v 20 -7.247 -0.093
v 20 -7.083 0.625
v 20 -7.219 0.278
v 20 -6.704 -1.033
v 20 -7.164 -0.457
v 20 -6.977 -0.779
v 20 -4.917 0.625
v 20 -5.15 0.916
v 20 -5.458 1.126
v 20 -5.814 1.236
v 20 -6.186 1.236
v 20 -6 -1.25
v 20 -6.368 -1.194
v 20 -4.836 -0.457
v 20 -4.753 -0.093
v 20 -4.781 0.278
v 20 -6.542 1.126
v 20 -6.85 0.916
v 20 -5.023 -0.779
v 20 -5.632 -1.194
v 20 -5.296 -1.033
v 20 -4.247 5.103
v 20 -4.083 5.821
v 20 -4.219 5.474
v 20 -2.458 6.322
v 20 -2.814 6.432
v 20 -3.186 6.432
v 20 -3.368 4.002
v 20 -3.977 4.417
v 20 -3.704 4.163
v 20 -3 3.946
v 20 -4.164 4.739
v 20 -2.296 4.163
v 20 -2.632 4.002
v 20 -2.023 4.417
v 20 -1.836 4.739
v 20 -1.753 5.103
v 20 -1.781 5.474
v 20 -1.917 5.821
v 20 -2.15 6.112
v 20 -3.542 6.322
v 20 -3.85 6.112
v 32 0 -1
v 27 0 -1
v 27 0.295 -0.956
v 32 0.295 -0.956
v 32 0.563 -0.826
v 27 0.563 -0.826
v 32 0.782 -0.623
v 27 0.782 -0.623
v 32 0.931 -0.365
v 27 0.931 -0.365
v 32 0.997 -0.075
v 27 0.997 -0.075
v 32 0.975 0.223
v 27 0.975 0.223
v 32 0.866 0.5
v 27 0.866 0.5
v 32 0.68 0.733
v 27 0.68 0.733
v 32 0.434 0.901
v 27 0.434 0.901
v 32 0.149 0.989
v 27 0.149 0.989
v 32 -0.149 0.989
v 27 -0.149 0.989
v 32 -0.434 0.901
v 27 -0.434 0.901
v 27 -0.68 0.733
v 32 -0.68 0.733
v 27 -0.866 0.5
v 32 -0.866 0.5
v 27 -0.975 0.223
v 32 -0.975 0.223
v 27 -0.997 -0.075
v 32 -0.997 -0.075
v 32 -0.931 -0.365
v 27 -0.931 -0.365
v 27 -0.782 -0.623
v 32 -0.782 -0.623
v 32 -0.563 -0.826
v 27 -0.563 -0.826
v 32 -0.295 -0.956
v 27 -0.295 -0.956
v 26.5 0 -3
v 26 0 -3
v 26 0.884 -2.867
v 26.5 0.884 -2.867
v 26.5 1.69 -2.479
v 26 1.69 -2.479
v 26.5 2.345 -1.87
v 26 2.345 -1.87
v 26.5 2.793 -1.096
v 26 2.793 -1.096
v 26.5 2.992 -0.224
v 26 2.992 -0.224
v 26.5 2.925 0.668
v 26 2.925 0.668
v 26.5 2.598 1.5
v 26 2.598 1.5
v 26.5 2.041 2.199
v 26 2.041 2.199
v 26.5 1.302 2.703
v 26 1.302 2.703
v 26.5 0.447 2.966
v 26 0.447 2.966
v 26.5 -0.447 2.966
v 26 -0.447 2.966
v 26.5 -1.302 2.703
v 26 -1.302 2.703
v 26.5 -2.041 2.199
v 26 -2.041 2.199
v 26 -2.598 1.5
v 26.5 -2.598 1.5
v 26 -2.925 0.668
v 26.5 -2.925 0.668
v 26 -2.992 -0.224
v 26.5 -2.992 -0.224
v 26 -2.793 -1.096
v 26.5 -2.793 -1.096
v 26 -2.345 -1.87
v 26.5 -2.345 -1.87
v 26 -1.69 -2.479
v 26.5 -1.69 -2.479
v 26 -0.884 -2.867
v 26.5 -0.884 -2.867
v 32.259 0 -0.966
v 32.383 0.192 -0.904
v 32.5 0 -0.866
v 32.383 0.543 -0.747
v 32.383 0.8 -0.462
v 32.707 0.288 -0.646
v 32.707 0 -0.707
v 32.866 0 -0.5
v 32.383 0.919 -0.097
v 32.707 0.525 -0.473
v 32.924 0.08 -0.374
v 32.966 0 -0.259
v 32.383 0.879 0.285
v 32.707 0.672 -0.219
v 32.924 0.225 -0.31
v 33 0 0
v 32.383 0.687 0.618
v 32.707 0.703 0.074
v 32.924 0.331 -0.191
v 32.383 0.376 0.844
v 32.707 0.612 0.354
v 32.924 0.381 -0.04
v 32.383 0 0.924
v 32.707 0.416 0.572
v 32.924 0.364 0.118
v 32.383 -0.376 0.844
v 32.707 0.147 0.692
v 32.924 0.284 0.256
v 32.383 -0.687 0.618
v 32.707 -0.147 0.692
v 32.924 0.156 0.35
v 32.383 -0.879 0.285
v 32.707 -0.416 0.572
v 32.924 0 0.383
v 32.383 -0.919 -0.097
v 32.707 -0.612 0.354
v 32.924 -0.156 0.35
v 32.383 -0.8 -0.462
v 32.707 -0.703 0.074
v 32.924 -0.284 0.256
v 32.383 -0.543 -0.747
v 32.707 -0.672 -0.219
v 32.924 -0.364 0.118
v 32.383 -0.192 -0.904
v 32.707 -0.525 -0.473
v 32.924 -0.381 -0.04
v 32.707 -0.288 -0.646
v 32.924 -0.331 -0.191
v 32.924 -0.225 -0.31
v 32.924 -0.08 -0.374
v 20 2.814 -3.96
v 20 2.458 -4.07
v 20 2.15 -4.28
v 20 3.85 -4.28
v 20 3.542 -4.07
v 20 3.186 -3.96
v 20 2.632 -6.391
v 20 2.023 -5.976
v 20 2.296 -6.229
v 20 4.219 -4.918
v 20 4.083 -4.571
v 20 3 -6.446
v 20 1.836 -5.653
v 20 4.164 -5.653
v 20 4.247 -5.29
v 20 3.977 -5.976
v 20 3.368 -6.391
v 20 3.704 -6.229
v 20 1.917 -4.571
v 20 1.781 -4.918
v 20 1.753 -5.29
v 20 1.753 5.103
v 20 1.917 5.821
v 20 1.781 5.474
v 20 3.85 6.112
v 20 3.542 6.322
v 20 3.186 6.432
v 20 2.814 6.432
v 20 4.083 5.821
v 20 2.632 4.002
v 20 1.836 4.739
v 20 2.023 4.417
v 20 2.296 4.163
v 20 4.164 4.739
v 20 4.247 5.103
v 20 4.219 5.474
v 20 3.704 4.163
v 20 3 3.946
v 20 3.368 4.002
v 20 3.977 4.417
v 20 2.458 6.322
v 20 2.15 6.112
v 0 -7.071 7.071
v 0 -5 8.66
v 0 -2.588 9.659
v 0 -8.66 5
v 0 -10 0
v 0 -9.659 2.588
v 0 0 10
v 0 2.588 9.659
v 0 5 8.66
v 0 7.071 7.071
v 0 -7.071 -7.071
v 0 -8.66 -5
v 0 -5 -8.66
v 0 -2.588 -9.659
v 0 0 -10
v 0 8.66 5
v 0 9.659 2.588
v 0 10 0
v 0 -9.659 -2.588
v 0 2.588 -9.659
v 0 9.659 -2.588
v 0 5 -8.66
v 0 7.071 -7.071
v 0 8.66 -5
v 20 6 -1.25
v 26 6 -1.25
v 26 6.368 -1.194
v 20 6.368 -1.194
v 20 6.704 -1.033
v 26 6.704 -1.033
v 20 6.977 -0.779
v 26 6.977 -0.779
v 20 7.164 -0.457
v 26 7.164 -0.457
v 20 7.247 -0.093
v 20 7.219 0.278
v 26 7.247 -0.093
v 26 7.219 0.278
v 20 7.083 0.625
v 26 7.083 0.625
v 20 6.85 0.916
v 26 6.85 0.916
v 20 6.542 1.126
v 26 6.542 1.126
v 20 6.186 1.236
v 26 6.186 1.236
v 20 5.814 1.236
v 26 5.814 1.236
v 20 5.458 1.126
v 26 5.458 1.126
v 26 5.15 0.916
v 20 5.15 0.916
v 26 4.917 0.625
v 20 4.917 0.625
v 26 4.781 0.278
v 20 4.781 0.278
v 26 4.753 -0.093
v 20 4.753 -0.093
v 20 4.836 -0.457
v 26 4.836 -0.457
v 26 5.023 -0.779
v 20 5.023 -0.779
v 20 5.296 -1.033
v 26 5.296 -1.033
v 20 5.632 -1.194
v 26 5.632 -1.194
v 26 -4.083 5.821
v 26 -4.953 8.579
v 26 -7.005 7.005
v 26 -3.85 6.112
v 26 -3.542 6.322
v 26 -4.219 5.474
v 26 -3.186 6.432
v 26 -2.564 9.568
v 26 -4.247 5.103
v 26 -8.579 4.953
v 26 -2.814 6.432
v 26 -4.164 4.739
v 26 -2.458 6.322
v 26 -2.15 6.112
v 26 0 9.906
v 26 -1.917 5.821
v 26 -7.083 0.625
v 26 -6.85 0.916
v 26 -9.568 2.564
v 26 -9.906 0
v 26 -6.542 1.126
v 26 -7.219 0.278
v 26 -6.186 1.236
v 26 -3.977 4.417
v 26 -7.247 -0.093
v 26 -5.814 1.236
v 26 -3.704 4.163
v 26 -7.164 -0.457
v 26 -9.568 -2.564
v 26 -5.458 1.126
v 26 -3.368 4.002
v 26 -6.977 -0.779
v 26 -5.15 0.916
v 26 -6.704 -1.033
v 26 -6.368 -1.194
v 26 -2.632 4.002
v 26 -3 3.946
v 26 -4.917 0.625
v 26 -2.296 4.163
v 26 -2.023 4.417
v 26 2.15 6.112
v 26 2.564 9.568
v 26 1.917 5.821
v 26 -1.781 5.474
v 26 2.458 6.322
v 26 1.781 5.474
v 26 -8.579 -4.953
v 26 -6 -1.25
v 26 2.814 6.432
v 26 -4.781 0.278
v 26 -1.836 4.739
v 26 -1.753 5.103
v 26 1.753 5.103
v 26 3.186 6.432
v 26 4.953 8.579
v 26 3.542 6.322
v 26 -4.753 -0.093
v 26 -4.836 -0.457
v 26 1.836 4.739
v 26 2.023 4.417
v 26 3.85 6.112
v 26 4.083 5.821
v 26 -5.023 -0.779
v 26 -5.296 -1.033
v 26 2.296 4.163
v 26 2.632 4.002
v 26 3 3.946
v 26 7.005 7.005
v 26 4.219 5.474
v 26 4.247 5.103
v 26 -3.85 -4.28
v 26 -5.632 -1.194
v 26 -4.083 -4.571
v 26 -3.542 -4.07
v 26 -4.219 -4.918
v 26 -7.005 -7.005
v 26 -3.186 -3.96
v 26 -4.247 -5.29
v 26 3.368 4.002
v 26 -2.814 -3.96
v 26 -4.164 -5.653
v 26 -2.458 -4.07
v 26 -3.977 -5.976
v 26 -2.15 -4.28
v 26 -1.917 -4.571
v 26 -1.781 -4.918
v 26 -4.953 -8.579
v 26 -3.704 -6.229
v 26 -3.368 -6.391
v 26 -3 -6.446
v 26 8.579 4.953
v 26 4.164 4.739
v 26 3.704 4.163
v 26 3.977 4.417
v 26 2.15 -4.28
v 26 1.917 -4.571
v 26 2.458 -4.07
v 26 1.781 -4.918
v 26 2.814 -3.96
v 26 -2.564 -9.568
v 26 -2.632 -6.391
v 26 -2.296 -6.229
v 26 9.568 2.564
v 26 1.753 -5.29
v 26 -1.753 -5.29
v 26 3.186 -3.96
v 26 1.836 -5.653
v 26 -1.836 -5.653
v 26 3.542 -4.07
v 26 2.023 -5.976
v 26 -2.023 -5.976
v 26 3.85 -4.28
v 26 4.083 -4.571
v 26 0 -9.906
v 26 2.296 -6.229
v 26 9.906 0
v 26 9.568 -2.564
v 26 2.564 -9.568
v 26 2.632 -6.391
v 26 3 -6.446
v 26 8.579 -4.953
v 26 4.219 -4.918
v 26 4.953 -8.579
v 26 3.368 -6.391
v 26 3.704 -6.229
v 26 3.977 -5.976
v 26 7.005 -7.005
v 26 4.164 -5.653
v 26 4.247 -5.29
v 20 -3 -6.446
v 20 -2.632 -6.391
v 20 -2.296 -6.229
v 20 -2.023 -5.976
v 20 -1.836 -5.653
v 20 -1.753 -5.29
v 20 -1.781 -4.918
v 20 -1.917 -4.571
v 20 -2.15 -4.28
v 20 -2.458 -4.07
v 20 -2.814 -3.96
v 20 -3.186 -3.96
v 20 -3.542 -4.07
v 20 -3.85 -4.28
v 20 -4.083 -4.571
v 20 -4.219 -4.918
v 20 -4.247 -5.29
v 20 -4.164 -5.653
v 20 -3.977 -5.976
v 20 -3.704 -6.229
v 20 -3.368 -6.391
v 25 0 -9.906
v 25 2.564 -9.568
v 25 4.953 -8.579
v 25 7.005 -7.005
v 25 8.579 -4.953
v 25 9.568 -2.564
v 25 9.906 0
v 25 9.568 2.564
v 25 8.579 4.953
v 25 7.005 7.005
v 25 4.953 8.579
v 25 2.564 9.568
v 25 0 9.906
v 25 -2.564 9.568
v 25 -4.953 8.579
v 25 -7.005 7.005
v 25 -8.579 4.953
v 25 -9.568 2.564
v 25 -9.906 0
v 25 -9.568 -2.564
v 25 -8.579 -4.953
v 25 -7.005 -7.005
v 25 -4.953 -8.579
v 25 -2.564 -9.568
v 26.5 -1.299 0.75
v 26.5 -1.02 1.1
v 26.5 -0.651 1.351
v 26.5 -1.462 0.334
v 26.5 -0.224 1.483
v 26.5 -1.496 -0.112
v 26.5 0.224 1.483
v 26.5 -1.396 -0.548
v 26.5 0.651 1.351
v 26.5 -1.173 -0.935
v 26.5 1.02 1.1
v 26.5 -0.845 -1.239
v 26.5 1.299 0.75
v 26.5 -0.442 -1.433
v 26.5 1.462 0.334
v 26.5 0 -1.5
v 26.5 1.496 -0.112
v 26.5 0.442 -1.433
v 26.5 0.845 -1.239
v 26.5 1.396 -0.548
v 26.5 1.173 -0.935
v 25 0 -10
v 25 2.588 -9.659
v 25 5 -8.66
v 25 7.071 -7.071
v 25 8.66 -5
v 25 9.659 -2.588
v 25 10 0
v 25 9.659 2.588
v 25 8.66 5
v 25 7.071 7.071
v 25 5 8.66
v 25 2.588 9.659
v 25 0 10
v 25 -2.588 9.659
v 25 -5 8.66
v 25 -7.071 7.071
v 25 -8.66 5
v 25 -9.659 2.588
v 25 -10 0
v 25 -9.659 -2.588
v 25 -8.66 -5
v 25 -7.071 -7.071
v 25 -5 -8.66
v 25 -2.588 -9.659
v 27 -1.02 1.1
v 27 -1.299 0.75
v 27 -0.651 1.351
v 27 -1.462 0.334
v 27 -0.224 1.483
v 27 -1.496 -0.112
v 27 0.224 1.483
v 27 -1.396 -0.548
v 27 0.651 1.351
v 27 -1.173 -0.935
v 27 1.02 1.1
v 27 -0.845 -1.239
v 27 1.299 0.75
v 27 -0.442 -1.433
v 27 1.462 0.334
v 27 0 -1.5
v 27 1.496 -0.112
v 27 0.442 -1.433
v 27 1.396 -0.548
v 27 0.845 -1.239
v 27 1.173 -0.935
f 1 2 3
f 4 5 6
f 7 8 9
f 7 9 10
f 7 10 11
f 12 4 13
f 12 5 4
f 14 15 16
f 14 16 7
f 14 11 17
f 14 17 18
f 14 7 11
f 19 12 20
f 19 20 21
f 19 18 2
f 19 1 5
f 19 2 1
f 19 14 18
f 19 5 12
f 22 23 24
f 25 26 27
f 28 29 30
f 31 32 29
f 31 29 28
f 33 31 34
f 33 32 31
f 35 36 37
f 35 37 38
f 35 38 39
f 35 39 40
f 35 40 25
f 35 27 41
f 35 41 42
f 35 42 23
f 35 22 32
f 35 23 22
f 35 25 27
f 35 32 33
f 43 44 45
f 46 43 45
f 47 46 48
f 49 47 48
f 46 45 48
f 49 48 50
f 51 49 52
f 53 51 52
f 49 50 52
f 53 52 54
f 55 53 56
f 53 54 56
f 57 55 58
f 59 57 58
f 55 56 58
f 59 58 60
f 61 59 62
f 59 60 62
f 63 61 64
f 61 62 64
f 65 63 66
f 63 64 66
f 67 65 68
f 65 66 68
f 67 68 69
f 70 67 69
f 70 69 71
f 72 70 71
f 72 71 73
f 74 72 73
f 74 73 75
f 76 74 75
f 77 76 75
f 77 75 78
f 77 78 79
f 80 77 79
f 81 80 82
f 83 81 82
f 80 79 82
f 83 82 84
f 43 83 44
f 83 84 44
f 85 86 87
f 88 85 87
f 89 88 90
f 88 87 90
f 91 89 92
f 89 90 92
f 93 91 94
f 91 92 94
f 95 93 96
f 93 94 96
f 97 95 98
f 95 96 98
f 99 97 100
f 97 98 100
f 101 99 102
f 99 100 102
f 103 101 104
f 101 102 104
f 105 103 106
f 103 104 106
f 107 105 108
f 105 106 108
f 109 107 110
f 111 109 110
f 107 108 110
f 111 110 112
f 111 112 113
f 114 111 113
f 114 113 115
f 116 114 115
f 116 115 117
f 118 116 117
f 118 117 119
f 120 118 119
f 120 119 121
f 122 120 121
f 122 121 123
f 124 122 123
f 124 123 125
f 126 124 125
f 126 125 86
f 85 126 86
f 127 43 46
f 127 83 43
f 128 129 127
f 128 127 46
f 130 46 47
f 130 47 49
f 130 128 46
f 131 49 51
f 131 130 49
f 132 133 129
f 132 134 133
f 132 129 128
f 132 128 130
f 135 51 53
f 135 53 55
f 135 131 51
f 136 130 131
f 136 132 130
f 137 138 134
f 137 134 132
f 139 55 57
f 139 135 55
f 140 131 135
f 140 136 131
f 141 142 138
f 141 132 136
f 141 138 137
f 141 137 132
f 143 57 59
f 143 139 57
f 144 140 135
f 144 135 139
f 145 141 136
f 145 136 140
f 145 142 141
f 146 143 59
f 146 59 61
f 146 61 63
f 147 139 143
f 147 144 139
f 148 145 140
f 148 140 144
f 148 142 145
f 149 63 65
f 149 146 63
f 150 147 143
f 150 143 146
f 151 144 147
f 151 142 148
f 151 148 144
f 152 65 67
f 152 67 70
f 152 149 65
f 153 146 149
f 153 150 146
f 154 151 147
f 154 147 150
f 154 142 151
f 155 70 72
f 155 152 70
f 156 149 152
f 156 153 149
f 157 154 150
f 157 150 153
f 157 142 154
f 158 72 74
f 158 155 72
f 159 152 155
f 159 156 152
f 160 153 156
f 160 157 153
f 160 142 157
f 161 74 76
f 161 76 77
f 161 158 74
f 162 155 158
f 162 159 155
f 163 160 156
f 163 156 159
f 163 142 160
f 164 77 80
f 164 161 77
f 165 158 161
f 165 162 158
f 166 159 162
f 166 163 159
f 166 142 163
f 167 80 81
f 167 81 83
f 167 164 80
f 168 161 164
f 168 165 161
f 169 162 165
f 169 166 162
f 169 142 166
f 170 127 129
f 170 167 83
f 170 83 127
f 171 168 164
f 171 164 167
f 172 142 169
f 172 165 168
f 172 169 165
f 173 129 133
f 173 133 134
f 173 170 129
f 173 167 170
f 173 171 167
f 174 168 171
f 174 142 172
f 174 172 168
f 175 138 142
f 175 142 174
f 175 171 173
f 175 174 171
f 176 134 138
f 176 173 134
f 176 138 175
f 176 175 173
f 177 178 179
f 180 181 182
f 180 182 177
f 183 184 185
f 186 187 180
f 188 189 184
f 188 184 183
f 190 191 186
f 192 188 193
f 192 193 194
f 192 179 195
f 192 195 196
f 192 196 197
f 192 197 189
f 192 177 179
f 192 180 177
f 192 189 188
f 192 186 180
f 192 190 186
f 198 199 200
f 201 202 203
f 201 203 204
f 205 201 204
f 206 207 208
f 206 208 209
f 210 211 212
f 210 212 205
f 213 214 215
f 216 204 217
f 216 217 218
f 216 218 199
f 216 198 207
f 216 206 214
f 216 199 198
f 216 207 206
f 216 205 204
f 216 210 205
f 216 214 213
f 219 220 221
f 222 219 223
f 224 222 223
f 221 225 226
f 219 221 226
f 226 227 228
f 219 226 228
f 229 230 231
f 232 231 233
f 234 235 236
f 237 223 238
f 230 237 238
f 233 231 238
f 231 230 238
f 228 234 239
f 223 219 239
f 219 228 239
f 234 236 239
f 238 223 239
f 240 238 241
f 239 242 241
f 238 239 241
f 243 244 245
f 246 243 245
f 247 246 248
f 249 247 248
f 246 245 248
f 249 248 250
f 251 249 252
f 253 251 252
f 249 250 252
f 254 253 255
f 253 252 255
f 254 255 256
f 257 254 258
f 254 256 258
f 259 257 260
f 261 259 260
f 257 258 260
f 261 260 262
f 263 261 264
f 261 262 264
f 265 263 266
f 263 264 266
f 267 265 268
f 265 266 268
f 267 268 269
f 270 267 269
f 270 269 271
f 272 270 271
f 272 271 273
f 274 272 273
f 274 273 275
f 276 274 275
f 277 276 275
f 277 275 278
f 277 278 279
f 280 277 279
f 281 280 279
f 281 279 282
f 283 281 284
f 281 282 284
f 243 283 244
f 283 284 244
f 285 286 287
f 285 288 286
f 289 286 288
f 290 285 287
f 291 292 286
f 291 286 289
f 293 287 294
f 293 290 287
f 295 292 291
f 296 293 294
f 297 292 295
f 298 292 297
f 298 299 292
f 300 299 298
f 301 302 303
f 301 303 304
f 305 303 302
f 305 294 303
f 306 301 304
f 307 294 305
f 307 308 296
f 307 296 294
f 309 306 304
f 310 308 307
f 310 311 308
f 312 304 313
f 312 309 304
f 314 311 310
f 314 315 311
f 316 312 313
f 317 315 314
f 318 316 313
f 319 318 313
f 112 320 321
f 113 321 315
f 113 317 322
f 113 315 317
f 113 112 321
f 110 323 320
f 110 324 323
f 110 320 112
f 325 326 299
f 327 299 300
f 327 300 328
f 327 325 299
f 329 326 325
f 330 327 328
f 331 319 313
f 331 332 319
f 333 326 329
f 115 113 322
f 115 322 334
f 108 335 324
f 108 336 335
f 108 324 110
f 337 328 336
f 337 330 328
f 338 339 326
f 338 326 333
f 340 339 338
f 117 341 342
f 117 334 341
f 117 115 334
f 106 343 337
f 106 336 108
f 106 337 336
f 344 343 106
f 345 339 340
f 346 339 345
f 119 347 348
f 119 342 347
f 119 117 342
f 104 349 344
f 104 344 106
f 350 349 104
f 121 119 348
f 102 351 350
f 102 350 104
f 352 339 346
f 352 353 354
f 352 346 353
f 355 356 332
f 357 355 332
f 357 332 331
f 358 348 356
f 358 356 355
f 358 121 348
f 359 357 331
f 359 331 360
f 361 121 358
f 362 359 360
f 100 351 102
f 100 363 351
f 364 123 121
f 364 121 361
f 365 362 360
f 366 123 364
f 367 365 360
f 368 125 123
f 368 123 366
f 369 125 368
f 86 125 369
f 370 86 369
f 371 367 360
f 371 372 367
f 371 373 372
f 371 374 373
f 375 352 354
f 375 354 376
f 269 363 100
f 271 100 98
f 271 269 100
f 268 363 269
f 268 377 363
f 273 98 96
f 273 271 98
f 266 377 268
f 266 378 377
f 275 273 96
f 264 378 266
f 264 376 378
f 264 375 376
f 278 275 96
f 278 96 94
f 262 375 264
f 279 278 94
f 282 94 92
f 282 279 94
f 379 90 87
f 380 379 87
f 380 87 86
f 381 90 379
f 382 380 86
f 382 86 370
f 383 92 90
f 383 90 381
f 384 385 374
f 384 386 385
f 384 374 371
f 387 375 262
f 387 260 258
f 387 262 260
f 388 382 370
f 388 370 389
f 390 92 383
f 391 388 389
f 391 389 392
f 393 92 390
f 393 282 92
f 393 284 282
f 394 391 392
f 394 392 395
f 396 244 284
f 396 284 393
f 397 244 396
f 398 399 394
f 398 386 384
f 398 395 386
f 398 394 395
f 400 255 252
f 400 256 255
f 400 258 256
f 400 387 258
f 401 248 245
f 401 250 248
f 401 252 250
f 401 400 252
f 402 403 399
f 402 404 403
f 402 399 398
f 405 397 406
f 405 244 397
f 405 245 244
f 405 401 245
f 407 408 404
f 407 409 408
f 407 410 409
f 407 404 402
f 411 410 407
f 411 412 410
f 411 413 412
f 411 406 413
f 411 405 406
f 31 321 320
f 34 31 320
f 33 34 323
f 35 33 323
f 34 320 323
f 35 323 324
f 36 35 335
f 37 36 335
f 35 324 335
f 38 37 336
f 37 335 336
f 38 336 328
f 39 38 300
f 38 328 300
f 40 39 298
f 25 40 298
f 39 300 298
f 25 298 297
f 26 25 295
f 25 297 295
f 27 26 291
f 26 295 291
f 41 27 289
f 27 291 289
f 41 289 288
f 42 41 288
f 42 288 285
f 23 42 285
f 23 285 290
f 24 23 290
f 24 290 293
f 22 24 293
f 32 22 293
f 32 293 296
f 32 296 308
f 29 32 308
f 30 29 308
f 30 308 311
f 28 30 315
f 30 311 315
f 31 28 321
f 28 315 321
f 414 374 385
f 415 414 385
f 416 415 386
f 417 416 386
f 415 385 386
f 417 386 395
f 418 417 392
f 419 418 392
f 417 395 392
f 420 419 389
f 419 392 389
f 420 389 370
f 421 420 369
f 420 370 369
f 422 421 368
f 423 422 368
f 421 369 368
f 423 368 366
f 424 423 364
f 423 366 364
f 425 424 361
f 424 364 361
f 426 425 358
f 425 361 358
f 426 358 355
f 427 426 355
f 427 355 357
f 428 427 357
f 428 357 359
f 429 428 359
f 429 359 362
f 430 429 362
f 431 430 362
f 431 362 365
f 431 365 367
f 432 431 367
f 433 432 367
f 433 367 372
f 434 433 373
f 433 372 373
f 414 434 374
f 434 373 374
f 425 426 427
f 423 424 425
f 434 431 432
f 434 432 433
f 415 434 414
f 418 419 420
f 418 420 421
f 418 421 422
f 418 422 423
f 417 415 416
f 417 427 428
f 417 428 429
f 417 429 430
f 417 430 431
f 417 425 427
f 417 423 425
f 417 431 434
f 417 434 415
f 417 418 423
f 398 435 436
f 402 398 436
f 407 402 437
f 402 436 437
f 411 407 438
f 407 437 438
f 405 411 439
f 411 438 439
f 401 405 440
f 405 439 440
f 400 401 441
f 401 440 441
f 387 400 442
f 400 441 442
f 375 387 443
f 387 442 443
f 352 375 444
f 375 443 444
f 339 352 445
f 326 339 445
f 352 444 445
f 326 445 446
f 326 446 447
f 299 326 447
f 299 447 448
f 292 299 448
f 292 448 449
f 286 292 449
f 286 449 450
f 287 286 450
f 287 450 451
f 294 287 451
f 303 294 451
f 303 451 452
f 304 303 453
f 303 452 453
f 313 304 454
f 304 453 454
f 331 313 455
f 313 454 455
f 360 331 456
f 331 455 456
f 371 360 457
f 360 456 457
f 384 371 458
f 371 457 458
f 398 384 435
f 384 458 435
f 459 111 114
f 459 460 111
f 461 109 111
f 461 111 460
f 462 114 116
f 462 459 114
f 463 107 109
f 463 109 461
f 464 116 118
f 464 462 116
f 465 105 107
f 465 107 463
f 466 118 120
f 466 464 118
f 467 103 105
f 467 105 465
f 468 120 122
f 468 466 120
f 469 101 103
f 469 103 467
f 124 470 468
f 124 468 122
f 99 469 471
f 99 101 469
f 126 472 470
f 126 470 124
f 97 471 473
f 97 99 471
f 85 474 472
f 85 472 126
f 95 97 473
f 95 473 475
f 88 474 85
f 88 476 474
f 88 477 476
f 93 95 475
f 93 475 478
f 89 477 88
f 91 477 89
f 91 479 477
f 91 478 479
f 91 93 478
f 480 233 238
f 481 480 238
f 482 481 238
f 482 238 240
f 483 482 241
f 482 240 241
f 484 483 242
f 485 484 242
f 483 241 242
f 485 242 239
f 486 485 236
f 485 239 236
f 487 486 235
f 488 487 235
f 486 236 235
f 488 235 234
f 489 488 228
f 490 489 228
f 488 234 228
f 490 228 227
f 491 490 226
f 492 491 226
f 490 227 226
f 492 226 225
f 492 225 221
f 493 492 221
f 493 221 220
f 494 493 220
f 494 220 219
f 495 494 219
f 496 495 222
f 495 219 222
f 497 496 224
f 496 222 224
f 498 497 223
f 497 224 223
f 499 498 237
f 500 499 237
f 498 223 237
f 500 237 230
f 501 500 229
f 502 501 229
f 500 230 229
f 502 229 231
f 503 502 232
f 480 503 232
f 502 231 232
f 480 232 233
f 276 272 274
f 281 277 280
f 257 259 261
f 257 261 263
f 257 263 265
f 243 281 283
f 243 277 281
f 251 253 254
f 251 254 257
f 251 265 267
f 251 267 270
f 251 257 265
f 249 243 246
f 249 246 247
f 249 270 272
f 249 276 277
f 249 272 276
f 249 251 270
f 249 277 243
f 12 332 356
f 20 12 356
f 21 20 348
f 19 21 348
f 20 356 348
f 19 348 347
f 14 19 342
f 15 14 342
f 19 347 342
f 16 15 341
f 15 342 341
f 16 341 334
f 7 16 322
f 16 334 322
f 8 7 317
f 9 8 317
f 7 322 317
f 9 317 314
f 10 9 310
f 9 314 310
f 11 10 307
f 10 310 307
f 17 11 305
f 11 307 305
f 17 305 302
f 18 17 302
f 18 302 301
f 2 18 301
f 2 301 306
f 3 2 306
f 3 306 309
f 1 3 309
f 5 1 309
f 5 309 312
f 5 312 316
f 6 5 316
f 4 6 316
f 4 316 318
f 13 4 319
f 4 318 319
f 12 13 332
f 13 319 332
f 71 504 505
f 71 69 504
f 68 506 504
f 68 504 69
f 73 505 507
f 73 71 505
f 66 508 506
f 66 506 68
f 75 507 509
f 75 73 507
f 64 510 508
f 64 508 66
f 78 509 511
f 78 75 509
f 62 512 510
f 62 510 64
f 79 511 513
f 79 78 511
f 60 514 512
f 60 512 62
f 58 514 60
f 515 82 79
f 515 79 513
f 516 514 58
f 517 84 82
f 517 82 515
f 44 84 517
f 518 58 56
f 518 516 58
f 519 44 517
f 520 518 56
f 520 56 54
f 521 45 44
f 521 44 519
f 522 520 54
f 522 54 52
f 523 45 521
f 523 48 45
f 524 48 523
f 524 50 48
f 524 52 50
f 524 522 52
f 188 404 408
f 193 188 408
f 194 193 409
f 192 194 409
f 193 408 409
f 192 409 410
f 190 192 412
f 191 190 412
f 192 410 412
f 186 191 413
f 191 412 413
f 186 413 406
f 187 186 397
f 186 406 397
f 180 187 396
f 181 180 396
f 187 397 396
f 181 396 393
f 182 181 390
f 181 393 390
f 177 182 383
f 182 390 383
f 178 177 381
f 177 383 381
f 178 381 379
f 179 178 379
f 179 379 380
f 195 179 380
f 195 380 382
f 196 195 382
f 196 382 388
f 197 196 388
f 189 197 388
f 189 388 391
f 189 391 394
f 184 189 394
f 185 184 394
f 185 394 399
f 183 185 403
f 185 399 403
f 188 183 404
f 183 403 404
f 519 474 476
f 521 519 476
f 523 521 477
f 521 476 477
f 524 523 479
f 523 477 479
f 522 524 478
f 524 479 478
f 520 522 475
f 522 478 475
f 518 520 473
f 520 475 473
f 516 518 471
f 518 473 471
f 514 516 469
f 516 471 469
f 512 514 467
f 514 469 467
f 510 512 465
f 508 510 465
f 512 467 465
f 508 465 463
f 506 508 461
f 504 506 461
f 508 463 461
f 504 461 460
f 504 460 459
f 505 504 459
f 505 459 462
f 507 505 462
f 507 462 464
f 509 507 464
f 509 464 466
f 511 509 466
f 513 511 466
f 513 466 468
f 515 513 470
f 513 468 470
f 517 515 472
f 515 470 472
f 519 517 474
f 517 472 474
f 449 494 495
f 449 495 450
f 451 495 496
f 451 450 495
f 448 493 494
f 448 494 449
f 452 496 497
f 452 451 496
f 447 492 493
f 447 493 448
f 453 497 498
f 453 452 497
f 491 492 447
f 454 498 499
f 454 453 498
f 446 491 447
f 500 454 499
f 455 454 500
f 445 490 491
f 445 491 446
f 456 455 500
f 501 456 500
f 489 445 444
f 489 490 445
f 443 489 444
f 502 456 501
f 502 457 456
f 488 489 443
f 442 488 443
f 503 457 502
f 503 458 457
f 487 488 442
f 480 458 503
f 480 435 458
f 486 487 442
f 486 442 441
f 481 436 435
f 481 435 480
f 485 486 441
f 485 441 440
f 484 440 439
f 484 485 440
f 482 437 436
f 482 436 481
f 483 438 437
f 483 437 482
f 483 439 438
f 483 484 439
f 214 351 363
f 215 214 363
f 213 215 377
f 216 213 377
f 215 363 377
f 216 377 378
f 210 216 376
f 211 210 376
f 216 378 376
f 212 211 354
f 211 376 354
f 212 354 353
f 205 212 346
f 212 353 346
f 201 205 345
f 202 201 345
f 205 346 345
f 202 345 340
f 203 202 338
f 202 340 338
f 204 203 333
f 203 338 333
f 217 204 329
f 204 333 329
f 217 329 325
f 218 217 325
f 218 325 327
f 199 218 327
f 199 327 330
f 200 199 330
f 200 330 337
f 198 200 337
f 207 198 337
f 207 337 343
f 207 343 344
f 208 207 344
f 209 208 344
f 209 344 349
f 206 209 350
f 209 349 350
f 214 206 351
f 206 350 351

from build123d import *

# Parameters (mm, degrees)
CROQUIS4_R              = 10
SALIENTE_EXTRUIR2_DEPTH = 25
CROQUIS5_R              = 3
SALIENTE_EXTRUIR3_DEPTH = 1.5
CROQUIS6_R              = 1.5
SALIENTE_EXTRUIR4_DEPTH = 0.5
CROQUIS7_R              = 1
SALIENTE_EXTRUIR5_DEPTH = 6
REDONDEO1_R             = 1
CROQUIS10_R             = 9.905946753
SALIENTE_EXTRUIR6_DEPTH = 1
CORTAR_EXTRUIR1_START   = 1
CROQUIS8_R              = 1.25
CORTAR_EXTRUIR1_DEPTH   = 6


with BuildPart() as part:
    # Croquis4 → Saliente-Extruir2 (new body)
    with BuildSketch(Plane(origin=(0, 0, 0), x_dir=(0, 0, -1), z_dir=(1, 0, 0))):
        Circle(CROQUIS4_R)
    extrude(amount=SALIENTE_EXTRUIR2_DEPTH)

    # Croquis5 → Saliente-Extruir3 (add)
    with BuildSketch(Plane(origin=(25, 0, 0), x_dir=(0, 0, -1), z_dir=(1, 0, 0))):
        Circle(CROQUIS5_R)
    extrude(amount=SALIENTE_EXTRUIR3_DEPTH)

    # Croquis6 → Saliente-Extruir4 (add)
    with BuildSketch(Plane(origin=(26.5, 0, 0), x_dir=(0, 0, -1), z_dir=(1, 0, 0))):
        Circle(CROQUIS6_R)
    extrude(amount=SALIENTE_EXTRUIR4_DEPTH)

    # Croquis7 → Saliente-Extruir5 (add)
    with BuildSketch(Plane(origin=(27, 0, 0), x_dir=(0, 0, -1), z_dir=(1, 0, 0))):
        Circle(CROQUIS7_R)
    extrude(amount=SALIENTE_EXTRUIR5_DEPTH)

    # Redondeo1
    redondeo1_edges = [part.edges().sort_by_distance(p)[0] for p in [
        (33, 0, 1),
    ]]
    fillet(redondeo1_edges, radius=REDONDEO1_R)

    # Croquis10 → Saliente-Extruir6 (add)
    with BuildSketch(Plane(origin=(25, 0, 0), x_dir=(0, 0, -1), z_dir=(1, 0, 0))):
        Circle(CROQUIS10_R)
    extrude(amount=SALIENTE_EXTRUIR6_DEPTH)

    # Croquis8 → Cortar-Extruir1 (cut)
    with BuildSketch(Plane(origin=(25, 0, 0), x_dir=(0, 0, -1), z_dir=(1, 0, 0)).offset(CORTAR_EXTRUIR1_START)):
        with Locations((0, 6)):
            Circle(CROQUIS8_R)
        with Locations((5.196152423, 3)):
            Circle(CROQUIS8_R)
        with Locations((5.196152423, -3)):
            Circle(CROQUIS8_R)
        with Locations((0, -6)):
            Circle(CROQUIS8_R)
        with Locations((-5.196152423, -3)):
            Circle(CROQUIS8_R)
        with Locations((-5.196152423, 3)):
            Circle(CROQUIS8_R)
    extrude(amount=-CORTAR_EXTRUIR1_DEPTH, mode=Mode.SUBTRACT)


solid = part.part
